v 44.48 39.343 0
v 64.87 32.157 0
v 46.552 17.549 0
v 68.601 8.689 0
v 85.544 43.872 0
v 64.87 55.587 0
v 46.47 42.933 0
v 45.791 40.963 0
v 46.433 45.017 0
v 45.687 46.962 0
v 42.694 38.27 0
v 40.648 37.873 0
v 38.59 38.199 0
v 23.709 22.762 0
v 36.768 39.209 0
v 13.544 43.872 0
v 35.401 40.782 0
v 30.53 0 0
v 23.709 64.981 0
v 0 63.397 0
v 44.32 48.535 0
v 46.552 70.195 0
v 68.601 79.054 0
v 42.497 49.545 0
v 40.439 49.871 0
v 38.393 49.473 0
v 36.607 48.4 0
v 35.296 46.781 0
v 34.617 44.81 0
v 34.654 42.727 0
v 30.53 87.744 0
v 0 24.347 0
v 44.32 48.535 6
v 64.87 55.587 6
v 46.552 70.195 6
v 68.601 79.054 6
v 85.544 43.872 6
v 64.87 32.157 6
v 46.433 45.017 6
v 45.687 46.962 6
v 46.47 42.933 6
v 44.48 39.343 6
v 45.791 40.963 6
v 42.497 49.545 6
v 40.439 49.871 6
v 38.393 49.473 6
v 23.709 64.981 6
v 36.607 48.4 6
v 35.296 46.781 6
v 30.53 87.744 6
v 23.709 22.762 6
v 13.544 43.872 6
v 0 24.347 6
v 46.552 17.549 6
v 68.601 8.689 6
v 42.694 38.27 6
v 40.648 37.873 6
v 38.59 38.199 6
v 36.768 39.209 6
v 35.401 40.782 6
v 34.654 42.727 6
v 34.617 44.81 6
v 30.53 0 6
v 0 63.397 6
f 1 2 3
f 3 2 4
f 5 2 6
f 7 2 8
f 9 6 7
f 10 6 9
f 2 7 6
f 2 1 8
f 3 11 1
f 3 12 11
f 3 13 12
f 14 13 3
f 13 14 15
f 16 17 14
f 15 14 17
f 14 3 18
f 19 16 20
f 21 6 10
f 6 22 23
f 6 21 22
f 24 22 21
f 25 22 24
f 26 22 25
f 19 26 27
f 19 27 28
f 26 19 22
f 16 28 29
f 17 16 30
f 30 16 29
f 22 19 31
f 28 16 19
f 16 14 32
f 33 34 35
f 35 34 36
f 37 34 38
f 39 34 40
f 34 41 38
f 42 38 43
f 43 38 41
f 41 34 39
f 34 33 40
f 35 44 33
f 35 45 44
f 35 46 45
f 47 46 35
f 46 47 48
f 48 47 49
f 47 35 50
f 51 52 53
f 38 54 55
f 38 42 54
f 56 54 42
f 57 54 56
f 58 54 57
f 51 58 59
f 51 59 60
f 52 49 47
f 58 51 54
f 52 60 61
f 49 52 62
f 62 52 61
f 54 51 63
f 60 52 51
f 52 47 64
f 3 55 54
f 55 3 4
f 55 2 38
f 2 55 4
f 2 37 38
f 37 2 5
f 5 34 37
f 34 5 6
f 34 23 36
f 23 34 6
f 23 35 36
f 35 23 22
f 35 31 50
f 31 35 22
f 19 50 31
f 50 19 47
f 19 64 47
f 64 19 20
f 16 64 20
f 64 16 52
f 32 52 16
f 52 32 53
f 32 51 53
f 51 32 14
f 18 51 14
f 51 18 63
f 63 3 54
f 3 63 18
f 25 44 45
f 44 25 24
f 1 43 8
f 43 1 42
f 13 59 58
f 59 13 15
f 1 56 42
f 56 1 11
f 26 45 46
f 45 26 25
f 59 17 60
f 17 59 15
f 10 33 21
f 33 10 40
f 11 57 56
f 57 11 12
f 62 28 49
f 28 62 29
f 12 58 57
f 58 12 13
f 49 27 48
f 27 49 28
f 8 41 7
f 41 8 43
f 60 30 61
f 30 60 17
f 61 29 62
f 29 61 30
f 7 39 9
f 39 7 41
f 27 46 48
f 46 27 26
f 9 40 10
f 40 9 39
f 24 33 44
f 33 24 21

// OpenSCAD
$fn = 32;

// ----------------------------------------------------------------------
// Star wheel: 7-point blunt, R45
// ----------------------------------------------------------------------

// --- parameters (mm) ---
n_points = 7;             // number of points / teeth
r_out = 45;               // tip radius
r_in = 27;                // root radius
bore_r = 6;               // centre bore radius
plate_t = 6;              // plate thickness, Z (extrusion height)
bore_d = 12;              // centre bore diameter
fit_tol = 0.1;            // declared fit tolerance (prompt contract)
free_tol = 0.5;           // declared free tolerance (prompt contract)

profile = [[85.544, 43.872], [64.87, 55.587], [68.601, 79.054], [46.552, 70.195], [30.53, 87.744], [23.709, 64.981], [0, 63.397], [13.544, 43.872], [0, 24.347], [23.709, 22.762], [30.53, 0], [46.552, 17.549], [68.601, 8.689], [64.87, 32.157]];  // primary outline, 14 points, counter clockwise
void_1 = [[46.433, 45.017], [45.687, 46.962], [44.32, 48.535], [42.497, 49.545], [40.439, 49.871], [38.393, 49.473], [36.607, 48.4], [35.296, 46.781], [34.617, 44.81], [34.654, 42.727], [35.401, 40.782], [36.768, 39.209], [38.59, 38.199], [40.648, 37.873], [42.694, 38.27], [44.48, 39.343], [45.791, 40.963], [46.47, 42.933]];  // centre bore, 18 points

// --- the one profile operation ---
difference() {
  linear_extrude(height = plate_t) polygon(points = profile);
  translate([0, 0, -1])
    linear_extrude(height = plate_t + 2) polygon(points = void_1);
}
